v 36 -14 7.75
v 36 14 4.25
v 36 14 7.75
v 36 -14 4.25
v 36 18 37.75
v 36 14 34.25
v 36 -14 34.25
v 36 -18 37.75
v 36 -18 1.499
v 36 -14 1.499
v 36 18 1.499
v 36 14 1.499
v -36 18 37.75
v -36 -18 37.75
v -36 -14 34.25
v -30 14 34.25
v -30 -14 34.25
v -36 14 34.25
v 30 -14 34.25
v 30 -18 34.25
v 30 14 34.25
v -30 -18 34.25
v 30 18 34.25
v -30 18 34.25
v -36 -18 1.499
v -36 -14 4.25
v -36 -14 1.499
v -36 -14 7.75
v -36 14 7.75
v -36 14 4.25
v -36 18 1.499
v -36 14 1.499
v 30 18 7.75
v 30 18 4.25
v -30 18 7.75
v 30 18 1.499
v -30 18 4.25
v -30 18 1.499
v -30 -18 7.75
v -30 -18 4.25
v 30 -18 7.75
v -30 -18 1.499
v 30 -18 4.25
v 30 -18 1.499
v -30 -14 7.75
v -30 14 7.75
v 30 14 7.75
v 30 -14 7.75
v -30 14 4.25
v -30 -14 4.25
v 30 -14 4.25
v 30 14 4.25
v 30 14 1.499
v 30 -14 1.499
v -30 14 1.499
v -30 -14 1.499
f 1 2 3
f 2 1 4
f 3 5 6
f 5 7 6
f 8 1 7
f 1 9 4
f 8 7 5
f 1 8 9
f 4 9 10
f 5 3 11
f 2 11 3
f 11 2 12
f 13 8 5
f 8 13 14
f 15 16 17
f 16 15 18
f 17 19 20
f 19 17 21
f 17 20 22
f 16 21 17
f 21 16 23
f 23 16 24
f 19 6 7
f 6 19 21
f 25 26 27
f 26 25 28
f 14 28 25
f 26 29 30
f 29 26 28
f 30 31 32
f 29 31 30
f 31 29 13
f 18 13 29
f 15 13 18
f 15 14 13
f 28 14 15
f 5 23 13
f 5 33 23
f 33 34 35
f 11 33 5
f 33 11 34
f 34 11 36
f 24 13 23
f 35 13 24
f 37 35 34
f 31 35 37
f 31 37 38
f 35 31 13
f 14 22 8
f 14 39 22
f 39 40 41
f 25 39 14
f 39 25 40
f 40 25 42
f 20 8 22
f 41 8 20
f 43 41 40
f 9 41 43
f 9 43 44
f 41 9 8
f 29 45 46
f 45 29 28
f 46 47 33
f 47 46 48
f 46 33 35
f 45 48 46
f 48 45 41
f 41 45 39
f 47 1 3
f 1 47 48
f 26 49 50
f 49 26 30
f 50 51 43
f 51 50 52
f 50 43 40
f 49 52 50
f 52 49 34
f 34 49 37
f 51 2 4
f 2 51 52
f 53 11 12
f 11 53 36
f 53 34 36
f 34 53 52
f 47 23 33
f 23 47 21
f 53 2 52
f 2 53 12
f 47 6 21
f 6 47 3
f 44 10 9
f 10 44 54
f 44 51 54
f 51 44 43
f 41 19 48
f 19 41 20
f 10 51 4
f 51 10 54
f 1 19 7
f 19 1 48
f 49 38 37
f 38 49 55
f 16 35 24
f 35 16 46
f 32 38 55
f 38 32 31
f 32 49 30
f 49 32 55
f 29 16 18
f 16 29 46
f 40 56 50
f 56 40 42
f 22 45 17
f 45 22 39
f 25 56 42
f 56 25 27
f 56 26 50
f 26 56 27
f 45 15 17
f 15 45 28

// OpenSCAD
tbx = 72;
tby = 36;
tbz = 3;
legx = 6;
legy = 4;
legz = 36;
tablesaw_x = 4;
tablesaw_Y = 4;
tablesaw_z = 4;

module tabletop() {
    cube([72,36,3.5],center=true);
}
module leg(x=6,y=4,z=36) {
    cube([x,y,z-tbz+.001],center=true);
}
module tablesaw(x=tablesaw_x, tablesaw_y, tbz) {
    difference()
    cube([x,y,z], center=true);
}

translate([0,0,36])
    tabletop();
translate([0,0,6])
    tabletop();

translate([tbx/2-legx/2,tby/2-legy/2,legz/2])
    leg();
translate([tbx/2-legx/2,-tby/2+legy/2,legz/2])
    leg();
translate([-tbx/2+legx/2,tby/2-legy/2,legz/2])
    leg();
translate([-tbx/2+legx/2,-tby/2+legy/2,legz/2])
    leg();
